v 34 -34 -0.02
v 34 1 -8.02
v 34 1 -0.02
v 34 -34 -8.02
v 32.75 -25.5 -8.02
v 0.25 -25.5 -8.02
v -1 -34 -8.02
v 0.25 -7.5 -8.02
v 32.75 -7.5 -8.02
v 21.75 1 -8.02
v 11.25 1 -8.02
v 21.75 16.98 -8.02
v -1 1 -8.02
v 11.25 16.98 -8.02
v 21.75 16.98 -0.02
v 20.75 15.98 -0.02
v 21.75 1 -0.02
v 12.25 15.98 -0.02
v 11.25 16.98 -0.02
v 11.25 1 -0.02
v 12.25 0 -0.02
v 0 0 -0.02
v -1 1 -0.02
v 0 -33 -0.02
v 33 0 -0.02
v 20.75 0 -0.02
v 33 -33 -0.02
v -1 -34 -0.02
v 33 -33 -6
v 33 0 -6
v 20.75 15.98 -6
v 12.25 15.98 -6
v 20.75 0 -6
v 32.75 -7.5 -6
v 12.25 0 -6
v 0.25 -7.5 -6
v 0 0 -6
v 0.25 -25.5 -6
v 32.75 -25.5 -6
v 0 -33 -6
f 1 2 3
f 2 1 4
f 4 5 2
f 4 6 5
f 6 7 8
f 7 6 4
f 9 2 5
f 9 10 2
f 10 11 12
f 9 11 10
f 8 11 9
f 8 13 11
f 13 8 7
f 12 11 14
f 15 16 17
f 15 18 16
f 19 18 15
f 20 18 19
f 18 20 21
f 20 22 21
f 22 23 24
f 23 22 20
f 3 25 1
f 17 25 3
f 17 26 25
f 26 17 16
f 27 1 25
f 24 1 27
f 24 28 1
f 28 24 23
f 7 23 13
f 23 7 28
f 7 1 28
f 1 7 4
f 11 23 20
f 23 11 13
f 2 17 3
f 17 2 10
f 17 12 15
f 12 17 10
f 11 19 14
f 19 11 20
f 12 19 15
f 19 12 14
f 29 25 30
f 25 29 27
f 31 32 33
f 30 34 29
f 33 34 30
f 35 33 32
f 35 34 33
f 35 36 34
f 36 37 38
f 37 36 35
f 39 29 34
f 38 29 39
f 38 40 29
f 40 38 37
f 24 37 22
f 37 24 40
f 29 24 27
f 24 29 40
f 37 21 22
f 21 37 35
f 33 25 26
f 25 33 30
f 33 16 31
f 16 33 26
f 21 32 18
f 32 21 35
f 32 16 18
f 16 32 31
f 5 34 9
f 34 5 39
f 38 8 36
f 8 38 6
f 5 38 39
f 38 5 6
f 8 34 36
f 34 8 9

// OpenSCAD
// file: layouts/l8-playa-hill.scad
POSITIONS = [
  [[100, 0, 60],  [20, 50, 50]],
  [[100, 90, 245],  [80, 40, 80]],
  [[90, 0, 320],  [70, 80, 50]],
];
INSERT_HEIGHT = 20;
INSERT_MARGIN = 7;
CAVITY_SCALE = 0.70;
CUBE_SIZE = 110;
FLOOR_SIZE = 55;
// file: constants.scad
include <layouts/l8-playa-hill.scad>

INCH = 25.4;
CEIL_CLEARANCE = 600;
NUM_PHONES = 3;
DRAW_RANDOM = false;


PANE_WIDTH = 10 * INCH;
PANE_HEIGHT = 8 * INCH;
PANE_THICKNESS = 2;

FRAME_PADDING = INCH / 4;

FRAME_WIDTH = PANE_WIDTH + 2 * FRAME_PADDING;
FRAME_HEIGHT = PANE_HEIGHT + 2 * FRAME_PADDING;
FRAME_THICKNESS = INCH / 4;


PHONE_HEIGHT = 147.8;
PHONE_WIDTH = 71.9;
PHONE_DEPTH = 9.1;
PHONE_SCREEN_TOP = 19; //wrt case top
PHONE_SCREEN_HEIGHT = 110;
PHONE_SCREEN_WIDTH = 68;
PHONE_LENS_DIA = 11.85;
PHONE_LENS_OFFSET_LEFT = 3;
PHONE_LENS_OFFSET_TOP = 3.65;
PHONE_LENS_FIELD_OF_VIEW = 81;
PHONE_POWER_BUTTON_TOP = 52;

CASE_THICKNESS = 1.5;
WALL_THICKNESS = 3;
CASE_HEIGHT = PHONE_HEIGHT + 2 * WALL_THICKNESS;
CASE_WIDTH = PHONE_WIDTH + 2 * WALL_THICKNESS;
CASE_DEPTH = PHONE_DEPTH + 2 * CASE_THICKNESS;

// new iteration using baby USB cams
BOARD_WIDTH = 33;
BOARD_HEIGHT = 33;
BOARD_DEPTH = 6;
BOARD_LENS_DIA = 7.75;

BOARD_HOLDER_MARGIN = 2; //temp to address poor fit. ===2

DISPLAY_WIDTH = 32.5;
DISPLAY_HEIGHT = 18;

USB_MICROB_WIDTH = 8.5;
USB_MICROB_LENGTH = 16;
USB_CHANNEL_WIDTH = 8.5;
USB_CHANNEL_LENGTH = 20;
USB_CHANNEL_DEPTH = 14;

RASPI_WIDTH = 50; // includes approximate USB clearance
RASPI_LENGTH = 70;
RASPI_HEIGHT = 30;


CASE_ANCHOR_OFFSET = 14;
CASE_ANCHOR_POINTS = [
  [0, 0, 0],
  [0, BOARD_HEIGHT, 0],
  [BOARD_WIDTH, BOARD_HEIGHT, 0],
  [BOARD_WIDTH, 0, 0]
];

PANE_ANCHOR_OFFSET = 0;
PANE_ANCHOR_POINTS = [
  [0, PANE_ANCHOR_OFFSET, 0],
  [0, PANE_HEIGHT - PANE_ANCHOR_OFFSET, 0],
  [PANE_WIDTH, PANE_HEIGHT - PANE_ANCHOR_OFFSET, 0],
  [PANE_WIDTH, PANE_ANCHOR_OFFSET, 0]
];

HOLDER_WIDTH = 100;
HOLDER_HEIGHT = 20;
HOLDER_DEPTH = 30;
HOLDER_FOOT = 10;


d = 0.01;
d2 = 2 * d;
wiggle = 1;
// main file
include <constants.scad>
$fn = 128;

module holder(margin = BOARD_HOLDER_MARGIN, depth = BOARD_DEPTH) {
  w = BOARD_WIDTH + margin;
  h = BOARD_HEIGHT + margin;
  d = depth + margin;
  translate([-margin/2, -margin/2, d2 - depth])
    union() {
      cube([w, h, d]);
    translate([BOARD_WIDTH/2 - USB_MICROB_WIDTH/2, -USB_MICROB_LENGTH + d2, 0])
      cube([USB_MICROB_WIDTH + margin, USB_MICROB_LENGTH + margin, depth + margin]);
  }
}

module slot(id = -1, cutout_depth = 70) {
  translate([0, 0, -cutout_depth])
  union() {
    cube([BOARD_WIDTH, BOARD_HEIGHT, BOARD_DEPTH + cutout_depth]);
    //room for SPI connection
    translate([BOARD_WIDTH/2 - USB_MICROB_WIDTH/2, -USB_MICROB_LENGTH + d2, 0])
      cube([USB_MICROB_WIDTH, USB_MICROB_LENGTH, BOARD_DEPTH + cutout_depth]);
    translate([BOARD_WIDTH/2 - DISPLAY_WIDTH/2, BOARD_HEIGHT/2 - DISPLAY_HEIGHT / 2, cutout_depth])
      cube([DISPLAY_WIDTH, DISPLAY_HEIGHT, cutout_depth]);
  }
}

rotate([180, 0, 0])
difference() {
  translate([0, 0, BOARD_DEPTH])
    holder();
  slot();
}
